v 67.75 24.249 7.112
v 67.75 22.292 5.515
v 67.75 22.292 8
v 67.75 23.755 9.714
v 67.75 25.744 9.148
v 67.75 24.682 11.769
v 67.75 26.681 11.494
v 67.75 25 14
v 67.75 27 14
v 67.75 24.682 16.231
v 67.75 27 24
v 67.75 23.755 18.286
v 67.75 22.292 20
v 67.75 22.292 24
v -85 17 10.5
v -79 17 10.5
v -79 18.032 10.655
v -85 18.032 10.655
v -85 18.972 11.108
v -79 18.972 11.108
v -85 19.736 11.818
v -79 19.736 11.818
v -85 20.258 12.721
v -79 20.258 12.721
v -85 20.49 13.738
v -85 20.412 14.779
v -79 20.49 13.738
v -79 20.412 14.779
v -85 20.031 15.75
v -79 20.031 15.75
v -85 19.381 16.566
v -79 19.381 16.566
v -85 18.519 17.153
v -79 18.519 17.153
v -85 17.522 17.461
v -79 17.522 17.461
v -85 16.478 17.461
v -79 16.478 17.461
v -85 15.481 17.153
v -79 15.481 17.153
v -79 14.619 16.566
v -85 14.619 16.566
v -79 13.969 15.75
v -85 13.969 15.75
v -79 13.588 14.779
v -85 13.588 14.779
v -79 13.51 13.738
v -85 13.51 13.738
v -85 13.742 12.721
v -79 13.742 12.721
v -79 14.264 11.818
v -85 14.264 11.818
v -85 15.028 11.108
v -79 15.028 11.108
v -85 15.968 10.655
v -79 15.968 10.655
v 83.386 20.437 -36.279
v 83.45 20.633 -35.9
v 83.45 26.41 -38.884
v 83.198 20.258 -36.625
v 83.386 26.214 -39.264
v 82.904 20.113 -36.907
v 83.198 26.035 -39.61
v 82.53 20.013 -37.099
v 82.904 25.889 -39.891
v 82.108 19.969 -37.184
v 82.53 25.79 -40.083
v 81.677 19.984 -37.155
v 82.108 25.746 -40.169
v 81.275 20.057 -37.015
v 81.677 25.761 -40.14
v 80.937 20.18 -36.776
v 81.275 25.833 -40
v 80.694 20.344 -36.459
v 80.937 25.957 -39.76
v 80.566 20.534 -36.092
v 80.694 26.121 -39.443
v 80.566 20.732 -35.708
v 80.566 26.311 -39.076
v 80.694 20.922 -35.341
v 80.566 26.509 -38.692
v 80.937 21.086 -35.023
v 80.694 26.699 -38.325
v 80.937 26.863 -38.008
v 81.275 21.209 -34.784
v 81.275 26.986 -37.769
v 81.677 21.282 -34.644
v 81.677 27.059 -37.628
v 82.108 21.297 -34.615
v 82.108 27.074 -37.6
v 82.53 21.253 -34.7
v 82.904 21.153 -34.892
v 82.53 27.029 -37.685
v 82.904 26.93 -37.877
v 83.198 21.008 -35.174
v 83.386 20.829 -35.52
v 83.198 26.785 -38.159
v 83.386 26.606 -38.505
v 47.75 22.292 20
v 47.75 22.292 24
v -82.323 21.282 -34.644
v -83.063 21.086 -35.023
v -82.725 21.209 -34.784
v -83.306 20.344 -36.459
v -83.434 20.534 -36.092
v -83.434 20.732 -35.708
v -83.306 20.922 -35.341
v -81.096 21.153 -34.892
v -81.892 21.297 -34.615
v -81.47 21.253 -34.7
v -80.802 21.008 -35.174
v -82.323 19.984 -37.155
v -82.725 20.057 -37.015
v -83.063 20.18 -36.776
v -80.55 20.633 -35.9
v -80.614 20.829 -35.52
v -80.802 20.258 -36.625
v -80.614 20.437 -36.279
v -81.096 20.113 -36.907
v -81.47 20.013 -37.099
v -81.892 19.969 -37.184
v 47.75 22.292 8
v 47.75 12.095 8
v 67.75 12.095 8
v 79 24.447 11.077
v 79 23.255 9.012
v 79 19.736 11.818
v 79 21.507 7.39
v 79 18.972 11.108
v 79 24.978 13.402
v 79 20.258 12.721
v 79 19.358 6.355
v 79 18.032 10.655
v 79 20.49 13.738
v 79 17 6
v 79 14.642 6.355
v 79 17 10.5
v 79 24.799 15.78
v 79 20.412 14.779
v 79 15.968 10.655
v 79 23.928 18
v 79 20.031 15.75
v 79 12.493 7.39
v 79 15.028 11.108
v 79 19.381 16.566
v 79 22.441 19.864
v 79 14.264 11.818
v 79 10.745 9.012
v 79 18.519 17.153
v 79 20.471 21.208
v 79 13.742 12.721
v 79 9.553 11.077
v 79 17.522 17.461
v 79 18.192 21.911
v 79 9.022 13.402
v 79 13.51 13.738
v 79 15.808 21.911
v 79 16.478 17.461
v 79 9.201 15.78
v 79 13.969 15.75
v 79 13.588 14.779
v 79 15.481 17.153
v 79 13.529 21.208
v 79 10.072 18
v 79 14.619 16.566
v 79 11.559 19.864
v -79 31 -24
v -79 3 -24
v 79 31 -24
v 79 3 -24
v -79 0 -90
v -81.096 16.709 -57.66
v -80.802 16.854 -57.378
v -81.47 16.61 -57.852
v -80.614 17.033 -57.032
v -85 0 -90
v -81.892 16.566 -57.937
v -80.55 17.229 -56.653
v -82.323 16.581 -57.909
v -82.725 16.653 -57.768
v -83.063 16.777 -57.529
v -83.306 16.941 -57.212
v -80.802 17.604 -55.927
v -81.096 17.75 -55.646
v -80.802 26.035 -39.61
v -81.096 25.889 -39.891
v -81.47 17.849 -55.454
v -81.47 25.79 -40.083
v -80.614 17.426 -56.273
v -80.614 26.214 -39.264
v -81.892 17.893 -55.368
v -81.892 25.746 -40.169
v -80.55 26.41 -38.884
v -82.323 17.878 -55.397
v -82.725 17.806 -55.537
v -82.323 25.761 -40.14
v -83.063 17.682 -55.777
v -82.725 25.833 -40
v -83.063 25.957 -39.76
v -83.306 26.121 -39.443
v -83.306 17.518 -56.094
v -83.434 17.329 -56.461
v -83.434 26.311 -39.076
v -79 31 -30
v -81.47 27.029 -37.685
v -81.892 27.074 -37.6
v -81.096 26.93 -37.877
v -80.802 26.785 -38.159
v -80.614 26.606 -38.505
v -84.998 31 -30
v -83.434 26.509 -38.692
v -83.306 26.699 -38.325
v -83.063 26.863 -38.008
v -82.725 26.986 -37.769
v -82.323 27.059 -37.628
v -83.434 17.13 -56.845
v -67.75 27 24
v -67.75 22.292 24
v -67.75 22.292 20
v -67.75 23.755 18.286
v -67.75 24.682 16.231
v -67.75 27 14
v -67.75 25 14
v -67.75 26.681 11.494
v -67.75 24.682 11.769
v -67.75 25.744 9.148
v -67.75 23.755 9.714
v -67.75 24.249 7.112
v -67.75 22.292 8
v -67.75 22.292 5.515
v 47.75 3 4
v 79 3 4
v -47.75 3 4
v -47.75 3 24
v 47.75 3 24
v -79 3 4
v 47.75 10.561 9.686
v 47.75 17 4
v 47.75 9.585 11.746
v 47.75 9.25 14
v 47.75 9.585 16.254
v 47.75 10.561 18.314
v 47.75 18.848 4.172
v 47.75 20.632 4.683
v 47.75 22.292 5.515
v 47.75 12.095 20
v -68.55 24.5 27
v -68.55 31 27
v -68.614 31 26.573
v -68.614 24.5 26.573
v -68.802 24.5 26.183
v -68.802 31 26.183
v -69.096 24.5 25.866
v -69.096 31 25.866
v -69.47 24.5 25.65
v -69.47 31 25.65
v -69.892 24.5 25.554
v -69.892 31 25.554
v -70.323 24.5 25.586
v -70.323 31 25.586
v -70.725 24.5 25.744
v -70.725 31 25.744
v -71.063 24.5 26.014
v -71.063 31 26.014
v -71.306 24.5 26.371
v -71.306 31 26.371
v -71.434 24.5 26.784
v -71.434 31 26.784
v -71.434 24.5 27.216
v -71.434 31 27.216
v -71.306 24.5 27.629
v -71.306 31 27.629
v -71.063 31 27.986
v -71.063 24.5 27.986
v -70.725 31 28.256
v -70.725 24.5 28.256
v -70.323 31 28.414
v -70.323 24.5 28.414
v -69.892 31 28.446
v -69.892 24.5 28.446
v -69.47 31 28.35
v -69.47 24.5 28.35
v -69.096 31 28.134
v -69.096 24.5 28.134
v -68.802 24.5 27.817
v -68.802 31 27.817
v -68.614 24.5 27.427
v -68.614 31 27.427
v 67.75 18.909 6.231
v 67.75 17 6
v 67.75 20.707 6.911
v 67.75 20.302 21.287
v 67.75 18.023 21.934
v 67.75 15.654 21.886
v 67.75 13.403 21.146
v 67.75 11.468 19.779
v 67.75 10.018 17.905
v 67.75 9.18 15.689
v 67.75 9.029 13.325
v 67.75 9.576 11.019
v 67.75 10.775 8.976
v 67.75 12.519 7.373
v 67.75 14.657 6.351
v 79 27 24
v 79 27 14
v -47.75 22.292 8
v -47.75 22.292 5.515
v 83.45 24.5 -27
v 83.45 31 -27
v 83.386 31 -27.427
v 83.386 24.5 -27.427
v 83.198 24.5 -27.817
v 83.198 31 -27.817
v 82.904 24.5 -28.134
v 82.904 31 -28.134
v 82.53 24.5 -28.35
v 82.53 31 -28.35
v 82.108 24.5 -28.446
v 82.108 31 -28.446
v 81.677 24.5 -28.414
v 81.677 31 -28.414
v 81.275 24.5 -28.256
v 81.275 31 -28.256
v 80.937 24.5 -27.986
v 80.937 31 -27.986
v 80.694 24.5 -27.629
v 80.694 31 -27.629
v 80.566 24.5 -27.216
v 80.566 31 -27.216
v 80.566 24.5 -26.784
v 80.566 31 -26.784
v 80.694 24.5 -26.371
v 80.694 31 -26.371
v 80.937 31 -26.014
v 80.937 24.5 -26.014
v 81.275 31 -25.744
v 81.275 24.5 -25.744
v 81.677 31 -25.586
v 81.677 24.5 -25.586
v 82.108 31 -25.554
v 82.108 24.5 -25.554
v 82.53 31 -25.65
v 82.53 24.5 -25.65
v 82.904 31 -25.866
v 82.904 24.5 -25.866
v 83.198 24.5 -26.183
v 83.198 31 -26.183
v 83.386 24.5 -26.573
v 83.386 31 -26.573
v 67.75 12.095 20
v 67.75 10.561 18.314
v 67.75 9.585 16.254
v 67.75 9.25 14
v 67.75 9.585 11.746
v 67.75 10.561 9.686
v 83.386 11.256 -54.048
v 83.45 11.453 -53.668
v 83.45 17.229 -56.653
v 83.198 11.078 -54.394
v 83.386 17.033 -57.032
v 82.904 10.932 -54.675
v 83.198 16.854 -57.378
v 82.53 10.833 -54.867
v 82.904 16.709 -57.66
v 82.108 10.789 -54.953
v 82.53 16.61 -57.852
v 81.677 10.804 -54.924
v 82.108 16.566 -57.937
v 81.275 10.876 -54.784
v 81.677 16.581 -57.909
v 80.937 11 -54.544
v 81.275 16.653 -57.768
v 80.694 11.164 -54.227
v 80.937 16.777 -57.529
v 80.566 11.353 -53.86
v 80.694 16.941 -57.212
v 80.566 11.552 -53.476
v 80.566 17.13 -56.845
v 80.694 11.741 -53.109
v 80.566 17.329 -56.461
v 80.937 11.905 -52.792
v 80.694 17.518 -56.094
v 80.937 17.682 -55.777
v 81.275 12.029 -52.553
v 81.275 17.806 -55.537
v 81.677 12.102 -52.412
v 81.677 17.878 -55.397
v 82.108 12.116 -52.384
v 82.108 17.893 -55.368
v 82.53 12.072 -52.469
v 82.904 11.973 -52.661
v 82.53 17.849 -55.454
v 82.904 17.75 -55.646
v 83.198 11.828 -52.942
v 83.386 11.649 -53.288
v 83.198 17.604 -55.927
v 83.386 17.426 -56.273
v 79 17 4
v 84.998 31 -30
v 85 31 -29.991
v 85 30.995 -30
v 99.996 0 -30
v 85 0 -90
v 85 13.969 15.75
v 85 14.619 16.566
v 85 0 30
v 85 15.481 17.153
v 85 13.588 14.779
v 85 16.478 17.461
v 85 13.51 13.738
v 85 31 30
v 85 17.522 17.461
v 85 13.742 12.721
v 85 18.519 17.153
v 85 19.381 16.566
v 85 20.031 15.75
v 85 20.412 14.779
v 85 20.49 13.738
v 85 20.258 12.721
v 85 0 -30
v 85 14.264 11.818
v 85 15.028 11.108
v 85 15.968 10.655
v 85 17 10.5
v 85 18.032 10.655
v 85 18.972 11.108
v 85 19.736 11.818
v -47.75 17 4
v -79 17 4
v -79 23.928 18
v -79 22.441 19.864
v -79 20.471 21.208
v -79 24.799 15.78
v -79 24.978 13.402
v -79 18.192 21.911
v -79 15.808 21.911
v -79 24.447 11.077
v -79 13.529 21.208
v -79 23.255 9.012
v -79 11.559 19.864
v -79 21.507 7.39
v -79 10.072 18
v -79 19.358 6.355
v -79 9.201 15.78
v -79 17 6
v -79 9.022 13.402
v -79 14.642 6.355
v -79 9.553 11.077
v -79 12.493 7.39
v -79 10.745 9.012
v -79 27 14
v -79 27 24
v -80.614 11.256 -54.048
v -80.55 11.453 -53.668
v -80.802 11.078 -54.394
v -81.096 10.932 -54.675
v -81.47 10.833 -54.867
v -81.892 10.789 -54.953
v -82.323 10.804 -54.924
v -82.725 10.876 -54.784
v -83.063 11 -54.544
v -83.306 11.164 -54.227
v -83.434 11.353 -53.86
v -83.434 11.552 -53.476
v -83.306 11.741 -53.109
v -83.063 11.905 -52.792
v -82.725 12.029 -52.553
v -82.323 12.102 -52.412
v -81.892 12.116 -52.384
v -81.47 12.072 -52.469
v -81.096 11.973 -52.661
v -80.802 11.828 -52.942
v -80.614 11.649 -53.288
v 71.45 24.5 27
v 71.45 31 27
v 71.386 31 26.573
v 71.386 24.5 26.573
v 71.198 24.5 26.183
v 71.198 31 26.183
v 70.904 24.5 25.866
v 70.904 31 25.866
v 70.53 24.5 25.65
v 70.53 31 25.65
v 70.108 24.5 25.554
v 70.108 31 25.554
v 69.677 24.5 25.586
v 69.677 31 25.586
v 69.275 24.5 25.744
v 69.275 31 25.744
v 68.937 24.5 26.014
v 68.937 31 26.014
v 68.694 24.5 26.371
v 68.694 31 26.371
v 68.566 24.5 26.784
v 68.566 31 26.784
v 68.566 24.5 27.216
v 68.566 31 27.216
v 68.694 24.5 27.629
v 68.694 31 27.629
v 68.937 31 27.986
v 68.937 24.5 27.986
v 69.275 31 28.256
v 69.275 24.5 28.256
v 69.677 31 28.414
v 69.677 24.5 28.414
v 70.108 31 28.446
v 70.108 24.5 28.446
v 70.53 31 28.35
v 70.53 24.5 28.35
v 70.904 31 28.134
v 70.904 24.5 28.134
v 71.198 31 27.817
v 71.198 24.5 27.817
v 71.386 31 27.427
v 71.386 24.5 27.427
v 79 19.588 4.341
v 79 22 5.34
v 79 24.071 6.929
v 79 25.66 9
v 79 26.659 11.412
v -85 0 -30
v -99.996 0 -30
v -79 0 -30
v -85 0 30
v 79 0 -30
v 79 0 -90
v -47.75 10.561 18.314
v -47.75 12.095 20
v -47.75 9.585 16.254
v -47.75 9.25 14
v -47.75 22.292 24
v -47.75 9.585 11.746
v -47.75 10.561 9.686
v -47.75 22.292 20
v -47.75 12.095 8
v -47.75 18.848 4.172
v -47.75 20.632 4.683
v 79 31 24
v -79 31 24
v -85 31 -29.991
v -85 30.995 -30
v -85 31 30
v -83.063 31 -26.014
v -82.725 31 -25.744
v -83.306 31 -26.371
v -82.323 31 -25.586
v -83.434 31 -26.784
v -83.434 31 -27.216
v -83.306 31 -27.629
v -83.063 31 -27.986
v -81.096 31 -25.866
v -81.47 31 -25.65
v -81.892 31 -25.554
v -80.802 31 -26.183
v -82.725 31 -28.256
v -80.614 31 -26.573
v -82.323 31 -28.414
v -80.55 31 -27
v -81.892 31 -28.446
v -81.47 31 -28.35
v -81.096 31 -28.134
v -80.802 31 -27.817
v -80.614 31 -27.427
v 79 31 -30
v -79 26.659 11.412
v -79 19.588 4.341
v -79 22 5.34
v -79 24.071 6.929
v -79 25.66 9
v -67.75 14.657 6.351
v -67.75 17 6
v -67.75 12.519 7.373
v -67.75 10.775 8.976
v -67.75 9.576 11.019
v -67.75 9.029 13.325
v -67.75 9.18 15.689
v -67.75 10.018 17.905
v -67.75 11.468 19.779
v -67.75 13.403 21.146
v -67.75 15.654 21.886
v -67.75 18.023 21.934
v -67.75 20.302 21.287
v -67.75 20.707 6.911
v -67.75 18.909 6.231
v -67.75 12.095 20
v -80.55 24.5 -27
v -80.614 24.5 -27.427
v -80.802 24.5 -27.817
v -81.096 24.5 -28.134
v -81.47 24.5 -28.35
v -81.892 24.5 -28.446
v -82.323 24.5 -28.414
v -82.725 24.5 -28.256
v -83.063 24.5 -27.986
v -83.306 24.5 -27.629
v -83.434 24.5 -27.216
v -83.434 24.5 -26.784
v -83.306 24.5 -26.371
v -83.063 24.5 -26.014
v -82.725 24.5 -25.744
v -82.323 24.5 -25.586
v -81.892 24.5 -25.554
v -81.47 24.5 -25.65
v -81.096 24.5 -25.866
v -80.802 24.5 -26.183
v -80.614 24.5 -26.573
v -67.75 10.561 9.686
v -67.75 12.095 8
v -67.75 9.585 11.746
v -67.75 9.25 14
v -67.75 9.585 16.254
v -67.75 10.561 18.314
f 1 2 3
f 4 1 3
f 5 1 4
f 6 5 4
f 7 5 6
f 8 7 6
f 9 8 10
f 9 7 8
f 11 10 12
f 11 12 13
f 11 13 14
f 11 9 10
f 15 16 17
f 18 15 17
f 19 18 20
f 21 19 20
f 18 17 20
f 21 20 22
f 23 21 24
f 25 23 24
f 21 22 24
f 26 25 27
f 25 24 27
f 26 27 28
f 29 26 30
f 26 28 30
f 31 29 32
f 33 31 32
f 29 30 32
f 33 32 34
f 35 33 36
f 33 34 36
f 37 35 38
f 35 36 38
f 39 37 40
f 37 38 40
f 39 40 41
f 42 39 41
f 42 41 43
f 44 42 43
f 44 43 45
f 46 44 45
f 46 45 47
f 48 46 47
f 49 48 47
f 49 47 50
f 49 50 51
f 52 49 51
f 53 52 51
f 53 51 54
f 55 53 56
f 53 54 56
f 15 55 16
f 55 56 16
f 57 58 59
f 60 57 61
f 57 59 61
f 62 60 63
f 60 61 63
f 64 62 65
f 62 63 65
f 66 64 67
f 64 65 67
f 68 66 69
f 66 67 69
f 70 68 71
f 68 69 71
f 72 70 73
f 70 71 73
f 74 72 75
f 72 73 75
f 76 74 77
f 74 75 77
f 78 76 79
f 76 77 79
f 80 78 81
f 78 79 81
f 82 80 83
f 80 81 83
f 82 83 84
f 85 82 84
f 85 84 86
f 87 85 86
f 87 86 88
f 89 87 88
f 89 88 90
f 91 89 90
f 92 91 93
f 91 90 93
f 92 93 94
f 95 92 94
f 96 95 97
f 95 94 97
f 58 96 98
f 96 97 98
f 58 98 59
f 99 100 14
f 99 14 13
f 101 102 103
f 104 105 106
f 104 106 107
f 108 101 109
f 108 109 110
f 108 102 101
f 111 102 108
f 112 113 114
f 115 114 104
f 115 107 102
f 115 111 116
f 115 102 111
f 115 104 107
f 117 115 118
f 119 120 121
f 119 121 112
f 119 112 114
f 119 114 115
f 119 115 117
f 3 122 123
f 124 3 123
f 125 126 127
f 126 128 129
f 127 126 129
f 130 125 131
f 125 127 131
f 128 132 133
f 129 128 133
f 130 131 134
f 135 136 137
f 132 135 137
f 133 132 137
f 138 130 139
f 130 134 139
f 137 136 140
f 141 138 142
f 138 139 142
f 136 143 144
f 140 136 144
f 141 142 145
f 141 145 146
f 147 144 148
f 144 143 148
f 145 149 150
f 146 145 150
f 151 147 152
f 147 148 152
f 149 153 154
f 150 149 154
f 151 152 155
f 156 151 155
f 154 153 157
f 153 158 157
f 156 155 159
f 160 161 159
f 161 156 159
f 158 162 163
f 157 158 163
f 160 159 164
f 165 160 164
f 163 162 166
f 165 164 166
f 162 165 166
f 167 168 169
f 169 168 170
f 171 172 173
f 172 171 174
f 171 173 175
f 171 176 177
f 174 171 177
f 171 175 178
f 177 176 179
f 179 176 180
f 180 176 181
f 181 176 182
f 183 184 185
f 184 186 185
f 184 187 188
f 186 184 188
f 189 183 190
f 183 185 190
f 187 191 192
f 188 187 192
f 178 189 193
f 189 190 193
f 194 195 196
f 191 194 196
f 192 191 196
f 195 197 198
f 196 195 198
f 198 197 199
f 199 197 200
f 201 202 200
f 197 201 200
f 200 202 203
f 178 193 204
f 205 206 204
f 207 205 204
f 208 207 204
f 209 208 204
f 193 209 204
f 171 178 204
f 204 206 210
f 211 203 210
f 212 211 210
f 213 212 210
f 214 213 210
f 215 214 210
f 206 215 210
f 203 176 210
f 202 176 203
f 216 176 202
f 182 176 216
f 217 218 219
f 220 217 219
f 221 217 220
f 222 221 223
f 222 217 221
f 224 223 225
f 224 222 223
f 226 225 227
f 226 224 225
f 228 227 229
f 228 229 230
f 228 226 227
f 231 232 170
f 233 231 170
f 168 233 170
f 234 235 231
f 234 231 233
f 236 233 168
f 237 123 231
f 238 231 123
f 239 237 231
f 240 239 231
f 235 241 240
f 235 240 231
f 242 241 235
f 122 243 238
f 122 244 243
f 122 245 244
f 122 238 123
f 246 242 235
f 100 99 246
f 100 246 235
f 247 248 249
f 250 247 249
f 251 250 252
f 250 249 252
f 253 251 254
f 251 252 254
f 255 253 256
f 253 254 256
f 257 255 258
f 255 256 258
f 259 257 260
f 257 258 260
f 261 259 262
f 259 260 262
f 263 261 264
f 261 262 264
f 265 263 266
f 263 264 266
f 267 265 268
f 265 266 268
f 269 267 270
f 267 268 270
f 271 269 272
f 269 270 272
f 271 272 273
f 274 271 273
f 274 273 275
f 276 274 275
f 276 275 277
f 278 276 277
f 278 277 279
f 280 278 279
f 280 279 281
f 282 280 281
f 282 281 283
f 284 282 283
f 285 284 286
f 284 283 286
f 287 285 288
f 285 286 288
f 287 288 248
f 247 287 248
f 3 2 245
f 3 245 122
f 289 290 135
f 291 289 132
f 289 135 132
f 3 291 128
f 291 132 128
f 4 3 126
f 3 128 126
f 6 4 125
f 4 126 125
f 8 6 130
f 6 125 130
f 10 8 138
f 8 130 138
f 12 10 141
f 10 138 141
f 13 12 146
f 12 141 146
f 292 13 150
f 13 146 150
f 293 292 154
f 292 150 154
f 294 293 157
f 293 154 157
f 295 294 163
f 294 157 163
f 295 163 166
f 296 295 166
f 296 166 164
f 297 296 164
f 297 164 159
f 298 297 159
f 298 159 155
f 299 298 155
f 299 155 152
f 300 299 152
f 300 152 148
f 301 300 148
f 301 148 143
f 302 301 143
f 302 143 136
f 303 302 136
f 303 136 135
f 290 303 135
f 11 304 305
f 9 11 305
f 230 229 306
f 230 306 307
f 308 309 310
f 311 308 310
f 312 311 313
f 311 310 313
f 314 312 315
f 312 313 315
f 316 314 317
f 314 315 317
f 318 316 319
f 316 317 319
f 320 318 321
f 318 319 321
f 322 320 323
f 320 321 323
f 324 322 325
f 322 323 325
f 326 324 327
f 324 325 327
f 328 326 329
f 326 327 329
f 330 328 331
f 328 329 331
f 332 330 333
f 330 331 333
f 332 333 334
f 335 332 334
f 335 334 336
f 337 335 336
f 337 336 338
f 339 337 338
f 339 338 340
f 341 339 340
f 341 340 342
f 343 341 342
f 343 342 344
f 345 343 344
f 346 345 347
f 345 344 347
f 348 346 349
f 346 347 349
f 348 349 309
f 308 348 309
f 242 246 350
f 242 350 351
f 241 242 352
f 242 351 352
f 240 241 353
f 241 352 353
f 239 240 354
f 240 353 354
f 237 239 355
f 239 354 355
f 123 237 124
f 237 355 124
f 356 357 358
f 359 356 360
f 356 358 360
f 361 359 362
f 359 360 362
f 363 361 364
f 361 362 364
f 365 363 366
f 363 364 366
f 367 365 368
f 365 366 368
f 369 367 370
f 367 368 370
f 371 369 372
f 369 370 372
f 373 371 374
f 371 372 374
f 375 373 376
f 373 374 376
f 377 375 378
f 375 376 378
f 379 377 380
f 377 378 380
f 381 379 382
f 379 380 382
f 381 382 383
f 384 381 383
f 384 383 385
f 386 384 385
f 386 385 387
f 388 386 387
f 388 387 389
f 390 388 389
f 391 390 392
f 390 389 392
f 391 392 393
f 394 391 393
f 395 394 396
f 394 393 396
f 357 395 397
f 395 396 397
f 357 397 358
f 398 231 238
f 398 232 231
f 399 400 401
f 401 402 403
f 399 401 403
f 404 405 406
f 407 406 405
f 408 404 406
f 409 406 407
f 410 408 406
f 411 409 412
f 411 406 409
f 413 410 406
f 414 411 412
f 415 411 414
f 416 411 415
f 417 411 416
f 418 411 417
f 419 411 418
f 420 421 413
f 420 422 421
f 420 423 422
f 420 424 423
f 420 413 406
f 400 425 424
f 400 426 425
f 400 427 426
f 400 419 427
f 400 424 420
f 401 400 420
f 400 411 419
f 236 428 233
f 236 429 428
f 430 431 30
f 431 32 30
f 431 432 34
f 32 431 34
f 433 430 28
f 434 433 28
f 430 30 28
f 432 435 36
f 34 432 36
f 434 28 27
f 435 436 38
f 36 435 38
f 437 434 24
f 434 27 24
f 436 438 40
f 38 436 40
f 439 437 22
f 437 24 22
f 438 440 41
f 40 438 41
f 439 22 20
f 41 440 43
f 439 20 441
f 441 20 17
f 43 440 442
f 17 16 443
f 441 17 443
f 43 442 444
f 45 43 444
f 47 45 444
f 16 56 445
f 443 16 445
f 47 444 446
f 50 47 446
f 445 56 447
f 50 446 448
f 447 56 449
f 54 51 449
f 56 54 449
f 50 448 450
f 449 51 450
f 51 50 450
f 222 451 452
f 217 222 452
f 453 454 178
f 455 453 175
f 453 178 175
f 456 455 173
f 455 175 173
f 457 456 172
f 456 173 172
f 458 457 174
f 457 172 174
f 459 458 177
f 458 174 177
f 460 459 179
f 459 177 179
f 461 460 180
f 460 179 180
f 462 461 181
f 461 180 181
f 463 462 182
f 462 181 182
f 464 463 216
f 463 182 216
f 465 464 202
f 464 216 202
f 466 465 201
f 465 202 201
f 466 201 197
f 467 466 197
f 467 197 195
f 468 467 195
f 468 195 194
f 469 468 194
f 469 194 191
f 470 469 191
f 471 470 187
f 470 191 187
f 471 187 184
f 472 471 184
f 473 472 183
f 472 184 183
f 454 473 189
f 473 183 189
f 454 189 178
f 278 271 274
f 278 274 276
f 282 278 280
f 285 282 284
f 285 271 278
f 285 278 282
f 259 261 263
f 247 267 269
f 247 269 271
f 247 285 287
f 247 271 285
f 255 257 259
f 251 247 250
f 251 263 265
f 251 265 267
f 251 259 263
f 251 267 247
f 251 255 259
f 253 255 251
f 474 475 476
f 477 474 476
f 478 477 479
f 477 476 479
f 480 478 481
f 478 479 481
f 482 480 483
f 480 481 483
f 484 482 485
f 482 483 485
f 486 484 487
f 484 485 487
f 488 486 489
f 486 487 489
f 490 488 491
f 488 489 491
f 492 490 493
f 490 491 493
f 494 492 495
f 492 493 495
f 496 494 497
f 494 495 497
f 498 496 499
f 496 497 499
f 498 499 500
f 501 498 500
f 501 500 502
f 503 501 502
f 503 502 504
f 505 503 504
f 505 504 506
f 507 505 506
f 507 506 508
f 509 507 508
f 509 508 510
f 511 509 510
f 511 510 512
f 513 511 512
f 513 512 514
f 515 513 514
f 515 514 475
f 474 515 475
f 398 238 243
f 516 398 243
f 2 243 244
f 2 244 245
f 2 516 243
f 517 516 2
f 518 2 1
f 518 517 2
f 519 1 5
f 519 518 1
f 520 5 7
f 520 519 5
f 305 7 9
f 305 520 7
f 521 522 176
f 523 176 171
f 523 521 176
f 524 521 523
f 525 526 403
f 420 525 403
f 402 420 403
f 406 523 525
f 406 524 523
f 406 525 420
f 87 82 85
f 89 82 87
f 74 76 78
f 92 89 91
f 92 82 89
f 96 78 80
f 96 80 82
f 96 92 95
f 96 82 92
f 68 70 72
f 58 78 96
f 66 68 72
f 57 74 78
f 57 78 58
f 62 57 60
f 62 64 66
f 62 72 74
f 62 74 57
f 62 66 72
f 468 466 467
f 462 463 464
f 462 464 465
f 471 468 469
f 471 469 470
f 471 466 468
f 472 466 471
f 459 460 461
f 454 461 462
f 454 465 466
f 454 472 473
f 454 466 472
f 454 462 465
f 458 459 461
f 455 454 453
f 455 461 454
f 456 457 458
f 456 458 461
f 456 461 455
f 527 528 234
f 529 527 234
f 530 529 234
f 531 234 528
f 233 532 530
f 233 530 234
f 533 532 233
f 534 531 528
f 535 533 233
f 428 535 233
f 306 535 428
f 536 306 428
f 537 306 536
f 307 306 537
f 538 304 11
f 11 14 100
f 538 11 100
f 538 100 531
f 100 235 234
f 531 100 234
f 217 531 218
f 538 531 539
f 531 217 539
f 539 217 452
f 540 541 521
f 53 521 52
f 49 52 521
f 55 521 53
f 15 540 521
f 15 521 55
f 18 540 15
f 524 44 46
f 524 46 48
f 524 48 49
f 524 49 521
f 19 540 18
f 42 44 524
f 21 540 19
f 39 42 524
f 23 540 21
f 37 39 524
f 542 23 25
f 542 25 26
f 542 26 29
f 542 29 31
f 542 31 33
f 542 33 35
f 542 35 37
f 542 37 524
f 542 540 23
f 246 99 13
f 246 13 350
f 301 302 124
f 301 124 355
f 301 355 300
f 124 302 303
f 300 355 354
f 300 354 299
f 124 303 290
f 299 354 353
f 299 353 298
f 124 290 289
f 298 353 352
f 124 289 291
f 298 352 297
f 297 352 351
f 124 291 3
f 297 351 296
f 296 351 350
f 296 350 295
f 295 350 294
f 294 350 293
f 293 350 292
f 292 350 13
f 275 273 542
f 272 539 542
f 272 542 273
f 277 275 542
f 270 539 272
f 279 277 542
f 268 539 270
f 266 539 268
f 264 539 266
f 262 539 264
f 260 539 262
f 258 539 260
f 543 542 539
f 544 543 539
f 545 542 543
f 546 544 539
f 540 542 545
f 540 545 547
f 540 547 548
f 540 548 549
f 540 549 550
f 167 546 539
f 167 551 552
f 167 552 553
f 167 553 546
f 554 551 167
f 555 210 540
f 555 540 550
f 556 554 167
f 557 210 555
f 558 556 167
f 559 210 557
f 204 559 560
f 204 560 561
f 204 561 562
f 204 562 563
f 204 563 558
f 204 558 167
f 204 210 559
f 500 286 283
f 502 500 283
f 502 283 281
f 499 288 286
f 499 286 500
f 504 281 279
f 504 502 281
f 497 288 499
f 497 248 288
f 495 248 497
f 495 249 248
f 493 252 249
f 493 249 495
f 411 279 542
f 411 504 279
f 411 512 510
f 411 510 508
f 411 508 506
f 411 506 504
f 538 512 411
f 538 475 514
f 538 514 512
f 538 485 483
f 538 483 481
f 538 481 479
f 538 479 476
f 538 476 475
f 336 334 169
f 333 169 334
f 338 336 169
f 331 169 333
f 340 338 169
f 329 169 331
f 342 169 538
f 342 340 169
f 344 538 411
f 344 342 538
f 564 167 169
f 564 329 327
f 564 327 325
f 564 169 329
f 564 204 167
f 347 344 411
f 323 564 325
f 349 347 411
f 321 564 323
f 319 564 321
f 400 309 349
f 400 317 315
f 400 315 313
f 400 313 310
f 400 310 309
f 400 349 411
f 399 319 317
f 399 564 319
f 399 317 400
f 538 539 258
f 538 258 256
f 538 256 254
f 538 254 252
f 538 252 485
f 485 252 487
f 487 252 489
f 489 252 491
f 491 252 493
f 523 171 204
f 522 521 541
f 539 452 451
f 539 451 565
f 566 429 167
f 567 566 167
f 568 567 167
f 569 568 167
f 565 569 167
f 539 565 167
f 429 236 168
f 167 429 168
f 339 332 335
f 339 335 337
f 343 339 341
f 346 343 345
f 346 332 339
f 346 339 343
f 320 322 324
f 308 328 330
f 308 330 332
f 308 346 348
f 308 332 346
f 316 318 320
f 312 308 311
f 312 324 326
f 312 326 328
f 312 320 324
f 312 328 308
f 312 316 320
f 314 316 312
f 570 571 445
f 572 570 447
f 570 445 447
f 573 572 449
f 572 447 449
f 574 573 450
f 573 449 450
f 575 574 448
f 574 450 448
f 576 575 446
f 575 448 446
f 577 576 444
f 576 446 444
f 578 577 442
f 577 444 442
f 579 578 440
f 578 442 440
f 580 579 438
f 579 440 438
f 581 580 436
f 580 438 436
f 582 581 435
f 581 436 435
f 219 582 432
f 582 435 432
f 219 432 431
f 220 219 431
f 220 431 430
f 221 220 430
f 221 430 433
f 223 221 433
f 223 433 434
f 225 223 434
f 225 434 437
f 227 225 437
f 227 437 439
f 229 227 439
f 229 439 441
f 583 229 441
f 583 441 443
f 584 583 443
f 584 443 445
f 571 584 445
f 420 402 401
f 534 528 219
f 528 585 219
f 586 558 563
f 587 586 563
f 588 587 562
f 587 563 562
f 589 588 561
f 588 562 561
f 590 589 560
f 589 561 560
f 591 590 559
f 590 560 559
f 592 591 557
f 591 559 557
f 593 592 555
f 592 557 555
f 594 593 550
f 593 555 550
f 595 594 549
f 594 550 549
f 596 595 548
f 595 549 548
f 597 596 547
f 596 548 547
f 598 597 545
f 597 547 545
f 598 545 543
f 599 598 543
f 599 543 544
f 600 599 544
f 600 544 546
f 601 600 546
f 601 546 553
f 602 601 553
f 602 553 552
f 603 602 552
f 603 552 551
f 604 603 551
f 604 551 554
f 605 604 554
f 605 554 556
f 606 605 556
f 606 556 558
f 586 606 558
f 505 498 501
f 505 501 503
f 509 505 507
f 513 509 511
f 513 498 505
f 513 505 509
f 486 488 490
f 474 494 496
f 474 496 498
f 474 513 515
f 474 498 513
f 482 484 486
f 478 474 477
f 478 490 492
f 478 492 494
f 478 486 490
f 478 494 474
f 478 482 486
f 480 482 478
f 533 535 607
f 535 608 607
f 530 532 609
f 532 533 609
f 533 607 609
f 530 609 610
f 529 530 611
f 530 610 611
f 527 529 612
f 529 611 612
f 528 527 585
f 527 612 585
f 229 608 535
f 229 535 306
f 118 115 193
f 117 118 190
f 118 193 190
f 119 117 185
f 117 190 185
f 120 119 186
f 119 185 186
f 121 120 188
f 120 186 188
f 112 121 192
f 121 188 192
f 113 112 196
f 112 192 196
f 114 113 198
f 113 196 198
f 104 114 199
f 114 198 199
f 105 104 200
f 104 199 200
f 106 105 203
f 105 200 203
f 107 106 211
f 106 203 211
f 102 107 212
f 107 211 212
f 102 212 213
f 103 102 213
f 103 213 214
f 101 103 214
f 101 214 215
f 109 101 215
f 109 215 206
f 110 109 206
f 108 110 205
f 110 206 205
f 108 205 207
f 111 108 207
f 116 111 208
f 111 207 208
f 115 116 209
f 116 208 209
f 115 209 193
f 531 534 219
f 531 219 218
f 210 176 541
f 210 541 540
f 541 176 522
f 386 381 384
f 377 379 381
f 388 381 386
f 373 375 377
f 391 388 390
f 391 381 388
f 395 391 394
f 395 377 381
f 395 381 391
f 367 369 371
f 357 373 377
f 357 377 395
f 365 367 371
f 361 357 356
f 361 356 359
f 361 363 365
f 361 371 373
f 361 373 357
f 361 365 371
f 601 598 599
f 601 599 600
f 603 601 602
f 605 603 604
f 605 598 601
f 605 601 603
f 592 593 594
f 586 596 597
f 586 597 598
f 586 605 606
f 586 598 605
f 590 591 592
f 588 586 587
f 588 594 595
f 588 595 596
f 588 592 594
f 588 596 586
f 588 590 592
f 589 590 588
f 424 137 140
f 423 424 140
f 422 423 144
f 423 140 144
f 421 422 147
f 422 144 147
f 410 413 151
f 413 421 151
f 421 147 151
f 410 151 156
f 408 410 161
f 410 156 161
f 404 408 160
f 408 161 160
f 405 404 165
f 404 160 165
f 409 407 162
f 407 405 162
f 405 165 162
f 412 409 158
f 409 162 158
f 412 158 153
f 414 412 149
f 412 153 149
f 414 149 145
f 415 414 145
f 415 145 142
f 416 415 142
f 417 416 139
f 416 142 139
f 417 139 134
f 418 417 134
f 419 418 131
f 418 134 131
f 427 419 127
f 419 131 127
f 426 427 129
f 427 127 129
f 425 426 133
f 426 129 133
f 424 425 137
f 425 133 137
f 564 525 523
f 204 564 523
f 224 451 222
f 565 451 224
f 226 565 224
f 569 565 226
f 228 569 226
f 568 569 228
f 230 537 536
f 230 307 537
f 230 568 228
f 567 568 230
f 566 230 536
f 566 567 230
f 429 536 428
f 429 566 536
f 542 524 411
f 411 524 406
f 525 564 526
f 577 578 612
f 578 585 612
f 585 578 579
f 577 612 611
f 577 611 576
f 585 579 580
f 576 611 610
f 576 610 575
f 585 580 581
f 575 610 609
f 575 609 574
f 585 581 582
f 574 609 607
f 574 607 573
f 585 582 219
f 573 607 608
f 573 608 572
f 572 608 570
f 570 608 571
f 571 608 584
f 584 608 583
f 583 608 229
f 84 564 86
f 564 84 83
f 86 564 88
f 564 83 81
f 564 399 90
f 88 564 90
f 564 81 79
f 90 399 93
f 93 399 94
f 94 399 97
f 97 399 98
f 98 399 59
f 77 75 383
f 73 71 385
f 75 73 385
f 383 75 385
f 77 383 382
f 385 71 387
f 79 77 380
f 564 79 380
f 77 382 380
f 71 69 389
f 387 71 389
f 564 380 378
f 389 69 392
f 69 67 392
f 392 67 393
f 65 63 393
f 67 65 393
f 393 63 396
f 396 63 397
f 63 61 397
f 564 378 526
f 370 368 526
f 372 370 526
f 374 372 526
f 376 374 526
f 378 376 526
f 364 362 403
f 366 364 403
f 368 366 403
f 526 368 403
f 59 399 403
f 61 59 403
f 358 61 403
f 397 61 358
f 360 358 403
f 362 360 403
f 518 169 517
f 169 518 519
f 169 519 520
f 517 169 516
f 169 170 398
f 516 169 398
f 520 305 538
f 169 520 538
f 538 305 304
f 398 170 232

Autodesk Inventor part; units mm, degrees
ref_plane "YZ Plane" through (0, 0, 0) normal (1, 0, 0) x (0, 1, 0)
ref_plane "XZ Plane" through (0, 0, 0) normal (0, 1, 0) x (-1, 0, 0)
sketch "Sketch1" plane through (0, 0, 0) normal (0, 1, 0) x (-1, 0, 0)
  line L0 (85, 30) -> (-85, 30)
  line L1 (-85, 30) -> (-85, -30)
  line L2 (-85, -30) -> (85, -30)
  line L3 (85, -30) -> (85, 30)
  line L4 (85, 30) -> (-85, -30) construction
  line L5 (-85, 30) -> (85, -30) construction
  line L6 (0, -42) -> (0, 42) projected
  point P0 (0, 0)
  point P1 (-100, -30)
  point P2 (-85, -27)
  dimension "d0" = 170
  dimension "d1" = 60
  dimension "d32" = 15
extrude "Extrusion1" add sketch "Sketch1" along normal blind 3
sketch "Sketch2" plane through (0, 3, 0) normal (0, 1, 0) x (1, 0, 0)
  line L0 (-85, 30) -> (-85, -30) projected
  line L1 (-85, -30) -> (85, -30) projected
  line L2 (85, -30) -> (85, 30) projected
  line L3 (79, -24) -> (-79, -24)
  line L4 (-79, -24) -> (-79, 24)
  line L5 (-79, 24) -> (79, 24)
  line L6 (79, 24) -> (79, -24)
  line L7 (79, -24) -> (-79, 24) construction
  line L8 (-79, -24) -> (79, 24) construction
  line L9 (85, 30) -> (-85, 30) projected
  point P0 (0, 0)
  dimension "d36" = 158
  dimension "d37" = 48
extrude "Extrusion2" add sketch "Sketch2" along normal blind 28
sketch "Sketch7" plane through (-79, 3, 24) normal (1, 0, 0) x (0, 0, -1)
  circle A0 centre (10, 14) radius 8
  line L0 (54, -3) -> (-6, -3) projected
  circle A1 centre (10, 14) radius 10
  line L1 (0, 14) -> (0, 0)
  line L2 (0, 14) -> (20, 14)
  line L3 (20, 14) -> (20, 0)
  line L4 (-6, -3) -> (-6, 28) projected
  line L5 (0, 0) -> (20, 0)
  line L6 (10, 24) -> (0, 24)
  line L7 (0, 0) -> (0, 28) projected
  line L8 (0, 14) -> (0, 24)
  point P0 (24, -3)
  point P1 (54, -3)
  dimension "MotorDiameter" = 16
  dimension "d18" = 17
  dimension "d20" = 2
  dimension "d40" = 20
  dimension "d62" = 10
extrude "Extrusion5" add sketch "Sketch7" along normal blind 11.25 contours L2 A1 A0 | A0 L2 A1 | L3 L5 L1 A1 | L7 L6 A1
sketch "Sketch8" plane through (-67.75, 3, 24) normal (1, 0, 0) x (0, 0, -1)
  arc A0 (20, 14) -> (10, 24) centre (10, 14) ccw projected
  circle A1 centre (10, 14) radius 8 projected
  line L0 (0, 0) -> (0, 24) projected
  line L1 (20, 0) -> (0, 0) projected
  line L2 (20, 0) -> (20, 14) projected
  circle A2 centre (10, 14) radius 7.75
  line L3 (10, 24) -> (0, 24) projected
  line L4 (0, 0) -> (0, 24) projected
  line L5 (4, 9.0946) -> (4, 19.2915)
  line L6 (10, 24) -> (0, 24) projected
  line L7 (16, 9.0946) -> (16, 19.2915)
  line L8 (16, 19.2915) -> (18.4853, 19.2915)
  arc A3 (20, 14) -> (10, 24) centre (10, 14) ccw projected
  line L9 (4, 19.2915) -> (0, 19.2915)
  point P0 (24, -3)
  point P1 (4, 27)
  point P2 (4, 18.9054)
  point P3 (16, 18.9054)
  dimension "d55" = 15.5
  dimension "d63" = 12
  dimension "d64" = 6
extrude "Extrusion6" add sketch "Sketch8" along normal blind 20 contours L2 L1 L0 L9 A1 L8 A0 | A1 L5 A2 L7 | A2 L7 | L5 A2 picked at (9.114, 6.2488)
sketch "Sketch9" plane through (-79, 20, 20) normal (1, 0, 0) x (0, 0, -1)
  circle A0 centre (6, -3) radius 3.5
  line L0 (50, -20) -> (-10, -20) projected
  line L1 (-10, -20) -> (-10, 11) projected
  point P0 (20, -20)
  point P1 (44, -20)
  dimension "d27" = 7
  dimension "d28" = 17
  dimension "d41" = 16
extrude "Extrusion7" cut sketch "Sketch9" against normal up to surface (6 mm away)
mirror "Mirror2" about plane through (0, 0, 0) normal (1, 0, 0) of "Extrusion7", "Extrusion6", "Extrusion5"
sketch "Sketch15" plane through (85, 0, 30) normal (1, 0, 0) x (0, 0, -1)
  line L0 (60, 31) -> (0, 31) projected
  line L1 (60, 31) -> (120, 0)
  line L2 (120, 0) -> (60, 0)
  circle A0 centre (16, 17) radius 3.5 projected
  line L3 (0, 0) -> (60, 0) projected
  line L4 (60, 0) -> (60, 31) projected
  line L5 (0, 31) -> (60, 31) projected
  line L6 (0, 0) -> (0, 31) projected
  point P0 (30, 0)
  dimension "d67" = 60
extrude "Extrusion12" add sketch "Sketch15" against normal blind 6 contours L1 L2 L4
mirror "Mirror5" about plane through (0, 0, 0) normal (1, 0, 0) of "Extrusion12"
sketch "Sketch16" plane through (79, 0, -30) normal (0, 0, -1) x (-1, 0, 0)
  line L0 (-6, 0) -> (-6, 31) projected
  line L1 (-6, 0) -> (0, 0) projected
  line L2 (0, 31) -> (0, 0) projected
  line L3 (-6, 31) -> (0, 31) projected
  line L4 (200.8, 0) -> (-56.8, 0) projected
  line L5 (-6, 31) -> (-21, 0)
  line L6 (-6, 0) -> (-21, 0)
  point P0 (79, 0)
  dimension "SideOffset" = 15
extrude "Extrusion13" add sketch "Sketch16" along normal blind 60 contours L4 L5 L0
ref_plane "Work Plane2" through (85, 31, -30) normal (-0.8782, -0.4249, 0.2195) x (0, -0.459, -0.8884)
sketch "Sketch19" plane through (85, 31, -30) normal (-0.8782, -0.4249, 0.2195) x (0, -0.459, -0.8884)
  line L0 (-86.7961, -100.9494) -> (167.9591, -100.9494)
  line L1 (167.9591, -100.9494) -> (167.9591, 132.7149)
  line L2 (167.9591, 132.7149) -> (-86.7961, 132.7149)
  line L3 (-86.7961, 132.7149) -> (-86.7961, -100.9494)
  point P0 (-12.4232, -4.3756)
extrude "Extrusion14" cut sketch "Sketch19" against normal blind 60
mirror "Mirror8" about plane through (0, 0, 0) normal (1, 0, 0) of "Extrusion13", "Extrusion14"
sketch "Sketch20" plane through (79, 0, -90) normal (0, 0.8884, -0.459) x (1, 0, 0)
  line L0 (6, 0) -> (6, -67.5352) projected
  line L1 (6, 0) -> (0, 0) projected
  line L2 (0, -67.5352) -> (0, 0) projected
  line L3 (6, -67.5352) -> (0, -67.5352) projected
  line L4 (-164, 0) -> (-164, -67.5352) projected
  line L5 (-158, -67.5352) -> (-164, -67.5352) projected
  line L6 (-158, -67.5352) -> (-158, 0) projected
  line L7 (-164, 0) -> (-158, 0) projected
  circle A0 centre (3, -57.5352) radius 1.45
  line L8 (6, -67.5352) -> (0, -67.5352) projected
  line L9 (3, -67.5352) -> (3, 0)
  circle A1 centre (3, -37.5352) radius 1.45
  line L10 (-79, 24.6917) -> (-79, -148.1499) projected
  circle A2 centre (-161, -57.5352) radius 1.45
  circle A3 centre (-161, -37.5352) radius 1.45
  point P0 (-79, -79.9583)
  dimension "d75" = 2.9
  dimension "d76" = 10
  dimension "d77" = 2.9
  dimension "d78" = 20
extrude "Extrusion15" cut sketch "Sketch20" against normal blind 6.5 contours A1 L9 | L9 A1 | L9 A0 | A0 L9 | A2 | A3
sketch "Sketch21" plane through (0, 31, 0) normal (0, 1, 0) x (1, 0, 0)
  line L0 (85, -30) -> (85, 30) projected
  line L1 (85, 30) -> (79, 30) projected
  line L2 (79, 30) -> (-79, 30) projected
  line L3 (-79, 30) -> (-85, 30) projected
  line L4 (-85, 30) -> (-85, -30) projected
  line L5 (-85, -30) -> (85, -30) projected
  line L6 (79, 24) -> (79, -24) projected
  line L7 (79, -24) -> (-79, -24) projected
  line L8 (-79, -24) -> (-79, 24) projected
  line L9 (-79, 24) -> (79, 24) projected
  line L10 (82, -30) -> (82, 30)
  line L11 (85, 30) -> (79, 30) projected
  line L12 (85, -30) -> (85, 30) projected
  line L13 (85, -27) -> (-85, -27)
  line L14 (-85, 30) -> (-85, -30) projected
  line L15 (85, 27) -> (-85, 27)
  circle A0 centre (82, 27) radius 1.45
  line L16 (0, 42) -> (0, -42) projected
  circle A1 centre (-82, 27) radius 1.45
  circle A2 centre (70, -27) radius 1.45
  circle A3 centre (-70, -27) radius 1.45
  point P0 (0, 0)
  dimension "d82" = 3
  dimension "d83" = 3
  dimension "d84" = 3
  dimension "d85" = 2.9
  dimension "d86" = 2.9
  dimension "d87" = 15
extrude "Extrusion16" cut sketch "Sketch21" against normal blind 6.5 contours A0 L10 L15 | L15 L10 A0 | A0 L15 L10 | A2 L13 | L13 A2 | L15 A0 L10 | A3 L13 | L13 A3 | A1 L15 | L15 A1
ref_plane "Work Plane3" through (-85, 31, -30) normal (-0.8782, 0.4249, -0.2195) x (0, -0.459, -0.8884)
equation "\"d0\" = Width"
equation "\"d1\" = Length"
equation "\"d32\" = -0.5 * Width + 0.5 * FullWidth"
equation "\"d2\" = BaseWallThickness"
equation "\"d36\" = Width - 2 * SideWallThickness"
equation "\"d37\" = Length - 2 * SideWallThickness"
equation "\"d5\" = Height - 2 * BaseWallThickness"
equation "\"d18\" = DriveMotorHeight"
equation "\"d20\" = DriveMotorMountThickness"
equation "\"d28\" = DriveMotorHeight"
equation "\"d41\" = SideWallThickness + DriveMotorMountThickness + 0.5 * MotorDiameter"
equation "\"d67\" = WedgeLength"
equation "\"d68\" = SideWallThickness"
equation "\"SideOffset\" = SideTriangleWidth"
equation "\"d71\" = WedgeLength"
equation "\"d73\" = WedgeLength"
equation "\"d75\" = ScrewHoleDia"
equation "\"d77\" = ScrewHoleDia"
equation "\"d79\" = ScrewDepth"
equation "\"d82\" = 0.5 * SideWallThickness"
equation "\"d83\" = 0.5 * SideWallThickness"
equation "\"d84\" = 0.5 * SideWallThickness"
equation "\"d85\" = ScrewHoleDia"
equation "\"d86\" = ScrewHoleDia"
equation "\"d88\" = ScrewDepth"
equation "\"SideWallThickness\" = 6"
equation "\"BaseWallThickness\" = 3"
equation "\"Width\" = 170"
equation "\"Length\" = 60"
equation "\"Height\" = 34"
equation "\"DriveMotorHeight\" = 17"
equation "\"DriveMotorMountThickness\" = 2"
equation "\"WedgeLength\" = 60"
equation "\"SideTriangleWidth\" = 15"
equation "\"ScrewHoleDia\" = 2.9"
equation "\"ScrewDepth\" = 6.5"
equation "\"FullWidth\" = 200"
properties part number "BodyWedgeV2" material "Thermoplastic Resin"
